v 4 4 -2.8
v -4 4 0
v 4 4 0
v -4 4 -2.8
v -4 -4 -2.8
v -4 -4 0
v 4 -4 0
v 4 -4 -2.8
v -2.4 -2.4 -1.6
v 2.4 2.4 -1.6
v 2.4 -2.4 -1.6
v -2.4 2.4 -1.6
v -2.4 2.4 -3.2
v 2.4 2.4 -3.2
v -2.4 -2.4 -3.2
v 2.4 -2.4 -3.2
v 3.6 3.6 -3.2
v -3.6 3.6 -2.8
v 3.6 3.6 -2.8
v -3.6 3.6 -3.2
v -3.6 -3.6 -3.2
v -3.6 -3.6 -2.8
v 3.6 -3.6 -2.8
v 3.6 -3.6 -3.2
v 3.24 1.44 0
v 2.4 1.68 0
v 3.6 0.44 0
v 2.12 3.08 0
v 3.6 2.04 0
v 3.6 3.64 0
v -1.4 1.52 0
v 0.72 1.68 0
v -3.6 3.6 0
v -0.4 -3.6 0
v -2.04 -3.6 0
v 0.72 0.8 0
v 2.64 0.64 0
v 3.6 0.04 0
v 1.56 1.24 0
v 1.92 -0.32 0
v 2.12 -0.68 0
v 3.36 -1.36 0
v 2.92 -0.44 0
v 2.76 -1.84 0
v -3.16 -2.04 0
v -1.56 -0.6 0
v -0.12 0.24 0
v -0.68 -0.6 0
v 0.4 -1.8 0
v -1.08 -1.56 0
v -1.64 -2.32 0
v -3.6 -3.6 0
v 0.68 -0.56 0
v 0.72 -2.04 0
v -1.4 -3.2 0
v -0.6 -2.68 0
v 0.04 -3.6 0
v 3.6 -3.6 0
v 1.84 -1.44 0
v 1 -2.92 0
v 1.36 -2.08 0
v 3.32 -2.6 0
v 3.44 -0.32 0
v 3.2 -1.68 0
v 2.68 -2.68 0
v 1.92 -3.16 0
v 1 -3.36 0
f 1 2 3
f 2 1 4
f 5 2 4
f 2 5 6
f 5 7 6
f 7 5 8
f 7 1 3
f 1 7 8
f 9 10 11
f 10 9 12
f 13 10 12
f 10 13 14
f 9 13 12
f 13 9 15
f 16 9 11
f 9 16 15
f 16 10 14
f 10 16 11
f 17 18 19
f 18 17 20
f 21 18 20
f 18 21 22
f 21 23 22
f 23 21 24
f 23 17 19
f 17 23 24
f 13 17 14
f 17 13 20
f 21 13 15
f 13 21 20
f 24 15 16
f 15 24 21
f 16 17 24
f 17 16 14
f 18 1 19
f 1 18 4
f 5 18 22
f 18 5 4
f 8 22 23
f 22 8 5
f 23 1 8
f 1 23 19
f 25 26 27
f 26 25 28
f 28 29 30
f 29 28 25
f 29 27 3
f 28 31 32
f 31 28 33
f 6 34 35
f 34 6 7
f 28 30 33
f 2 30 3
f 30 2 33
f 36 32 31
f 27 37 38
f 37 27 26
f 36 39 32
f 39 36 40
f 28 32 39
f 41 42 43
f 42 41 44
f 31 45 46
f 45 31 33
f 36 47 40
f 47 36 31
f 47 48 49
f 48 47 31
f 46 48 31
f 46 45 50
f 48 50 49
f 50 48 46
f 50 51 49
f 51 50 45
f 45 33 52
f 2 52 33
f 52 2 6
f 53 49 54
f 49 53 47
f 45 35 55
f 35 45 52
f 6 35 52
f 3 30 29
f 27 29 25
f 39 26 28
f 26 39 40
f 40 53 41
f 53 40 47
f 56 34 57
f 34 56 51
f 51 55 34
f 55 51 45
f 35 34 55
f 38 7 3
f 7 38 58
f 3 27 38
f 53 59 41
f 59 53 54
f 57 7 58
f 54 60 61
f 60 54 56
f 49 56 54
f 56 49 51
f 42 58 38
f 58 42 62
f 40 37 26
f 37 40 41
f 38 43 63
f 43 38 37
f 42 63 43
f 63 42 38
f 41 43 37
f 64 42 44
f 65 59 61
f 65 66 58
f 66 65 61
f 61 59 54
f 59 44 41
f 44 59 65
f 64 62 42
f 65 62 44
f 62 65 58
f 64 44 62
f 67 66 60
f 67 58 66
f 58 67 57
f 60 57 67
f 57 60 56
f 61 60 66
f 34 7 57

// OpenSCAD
// file: ../p/box5.scad
use <../lib.scad>
function ldraw_lib__box5() = [
// 0 Box with 5 Faces and All Edges
// 0 Name: box5.dat
// 0 Author: James Jessiman
// 0 !LDRAW_ORG Primitive UPDATE 2012-01
// 0 !LICENSE Licensed under CC BY 4.0 : see CAreadme.txt
// 
// 0 BFC CERTIFY CCW
  [0,"BFC","CERTIFY"],
  [0,"BFC","CCW"],
// 
// 0 !HISTORY 2002-04-03 [sbliss] Modified for BFC compliance
// 0 !HISTORY 2002-04-25 [PTadmin] Official Update 2002-02
// 0 !HISTORY 2007-06-24 [PTadmin] Header formatted for Contributor Agreement
// 0 !HISTORY 2008-07-01 [PTadmin] Official Update 2008-01
// 0 !HISTORY 2012-02-16 [Philo] Changed to CCW
// 0 !HISTORY 2012-03-30 [PTadmin] Official Update 2012-01
// 
// 
// 2 24 1 1 1 -1 1 1
  [2,24,1,1,1,-1,1,1],
// 2 24 -1 1 1 -1 1 -1
  [2,24,-1,1,1,-1,1,-1],
// 2 24 -1 1 -1 1 1 -1
  [2,24,-1,1,-1,1,1,-1],
// 2 24 1 1 -1 1 1 1
  [2,24,1,1,-1,1,1,1],
// 2 24 1 0 1 -1 0 1
  [2,24,1,0,1,-1,0,1],
// 2 24 -1 0 1 -1 0 -1
  [2,24,-1,0,1,-1,0,-1],
// 2 24 -1 0 -1 1 0 -1
  [2,24,-1,0,-1,1,0,-1],
// 2 24 1 0 -1 1 0 1
  [2,24,1,0,-1,1,0,1],
// 2 24 1 0 1 1 1 1
  [2,24,1,0,1,1,1,1],
// 2 24 -1 0 1 -1 1 1
  [2,24,-1,0,1,-1,1,1],
// 2 24 1 0 -1 1 1 -1
  [2,24,1,0,-1,1,1,-1],
// 2 24 -1 0 -1 -1 1 -1
  [2,24,-1,0,-1,-1,1,-1],
// 4 16 -1 1 1 1 1 1 1 1 -1 -1 1 -1
  [4,16,-1,1,1,1,1,1,1,1,-1,-1,1,-1],
// 4 16 -1 1 1 -1 0 1 1 0 1 1 1 1
  [4,16,-1,1,1,-1,0,1,1,0,1,1,1,1],
// 4 16 -1 1 -1 -1 0 -1 -1 0 1 -1 1 1
  [4,16,-1,1,-1,-1,0,-1,-1,0,1,-1,1,1],
// 4 16 1 1 -1 1 0 -1 -1 0 -1 -1 1 -1
  [4,16,1,1,-1,1,0,-1,-1,0,-1,-1,1,-1],
// 4 16 1 1 1 1 0 1 1 0 -1 1 1 -1
  [4,16,1,1,1,1,0,1,1,0,-1,1,1,-1],
];
module ldraw_lib__box5(step=0, col=false, unit=2/5, alt=false, line=0.2, solid=!$preview)
    makepoly(ldraw_lib__box5(), step=step, col=col, unit=unit, alt=alt, line=line, solid=solid);
ldraw_lib__box5(line=0.2);
// file: ../p/box4.scad
use <../lib.scad>
function ldraw_lib__box4() = [
// 0 Box with 4 Faces (2 Parallel Pairs) and All Edges
// 0 Name: box4.dat
// 0 Author: James Jessiman
// 0 !LDRAW_ORG Primitive UPDATE 2012-01
// 0 !LICENSE Licensed under CC BY 4.0 : see CAreadme.txt
// 
// 0 BFC CERTIFY CCW
  [0,"BFC","CERTIFY"],
  [0,"BFC","CCW"],
// 
// 0 !HISTORY 2002-04-03 [sbliss] Modified for BFC compliance
// 0 !HISTORY 2002-04-25 [PTadmin] Official Update 2002-02
// 0 !HISTORY 2007-06-24 [PTadmin] Header formatted for Contributor Agreement
// 0 !HISTORY 2008-07-01 [PTadmin] Official Update 2008-01
// 0 !HISTORY 2012-02-16 [Philo] Changed to CCW
// 0 !HISTORY 2012-03-30 [PTadmin] Official Update 2012-01
// 
// 
// 2 24 1 1 1 -1 1 1
  [2,24,1,1,1,-1,1,1],
// 2 24 -1 1 1 -1 1 -1
  [2,24,-1,1,1,-1,1,-1],
// 2 24 -1 1 -1 1 1 -1
  [2,24,-1,1,-1,1,1,-1],
// 2 24 1 1 -1 1 1 1
  [2,24,1,1,-1,1,1,1],
// 2 24 1 0 1 -1 0 1
  [2,24,1,0,1,-1,0,1],
// 2 24 -1 0 1 -1 0 -1
  [2,24,-1,0,1,-1,0,-1],
// 2 24 -1 0 -1 1 0 -1
  [2,24,-1,0,-1,1,0,-1],
// 2 24 1 0 -1 1 0 1
  [2,24,1,0,-1,1,0,1],
// 2 24 1 0 1 1 1 1
  [2,24,1,0,1,1,1,1],
// 2 24 -1 0 1 -1 1 1
  [2,24,-1,0,1,-1,1,1],
// 2 24 1 0 -1 1 1 -1
  [2,24,1,0,-1,1,1,-1],
// 2 24 -1 0 -1 -1 1 -1
  [2,24,-1,0,-1,-1,1,-1],
// 4 16 -1 1 1 -1 0 1 1 0 1 1 1 1
  [4,16,-1,1,1,-1,0,1,1,0,1,1,1,1],
// 4 16 -1 1 -1 -1 0 -1 -1 0 1 -1 1 1
  [4,16,-1,1,-1,-1,0,-1,-1,0,1,-1,1,1],
// 4 16 1 1 -1 1 0 -1 -1 0 -1 -1 1 -1
  [4,16,1,1,-1,1,0,-1,-1,0,-1,-1,1,-1],
// 4 16 1 1 1 1 0 1 1 0 -1 1 1 -1
  [4,16,1,1,1,1,0,1,1,0,-1,1,1,-1],
];
module ldraw_lib__box4(step=0, col=false, unit=2/5, alt=false, line=0.2, solid=!$preview)
    makepoly(ldraw_lib__box4(), step=step, col=col, unit=unit, alt=alt, line=line, solid=solid);
ldraw_lib__box4(line=0.2);
// file: s/3070bs01.scad
use <../../lib.scad>
use <../../p/box4.scad>
use <../../p/box5.scad>
function ldraw_lib__s__3070bs01() = [
// 0 ~Tile  1 x  1 with Groove without Top Face
// 0 Name: s\3070bs01.dat
// 0 Author: Chris Dee [cwdee]
// 0 !LDRAW_ORG Subpart UPDATE 2009-02
// 0 !LICENSE Licensed under CC BY 4.0 : see CAreadme.txt
// 
// 0 BFC CERTIFY CCW
  [0,"BFC","CERTIFY"],
  [0,"BFC","CCW"],
// 
// 0 !HISTORY 2009-09-03 [PTadmin] Official Update 2009-02
// 
// 
// 1 16 0 0 0 10 0 0 0 7 0 0 0 10 box4.dat
  [1,16,0,0,0,10,0,0,0,7,0,0,0,10, ldraw_lib__box4()],
// 0 BFC INVERTNEXT
  [0,"BFC","INVERTNEXT"],
// 1 16 0 8 0 6 0 0 0 -4 0 0 0 6 box5.dat
  [1,16,0,8,0,6,0,0,0,-4,0,0,0,6, ldraw_lib__box5()],
// 1 16 0 7 0 9 0 0 0 1 0 0 0 9 box4.dat
  [1,16,0,7,0,9,0,0,0,1,0,0,0,9, ldraw_lib__box4()],
// 
// 4 16 9 8 9 6 8 6 -6 8 6 -9 8 9
  [4,16,9,8,9,6,8,6,-6,8,6,-9,8,9],
// 4 16 -9 8 9 -6 8 6 -6 8 -6 -9 8 -9
  [4,16,-9,8,9,-6,8,6,-6,8,-6,-9,8,-9],
// 4 16 -9 8 -9 -6 8 -6 6 8 -6 9 8 -9
  [4,16,-9,8,-9,-6,8,-6,6,8,-6,9,8,-9],
// 4 16 9 8 -9 6 8 -6 6 8 6 9 8 9
  [4,16,9,8,-9,6,8,-6,6,8,6,9,8,9],
// 
// 4 16 10 7 10 9 7 9 -9 7 9 -10 7 10
  [4,16,10,7,10,9,7,9,-9,7,9,-10,7,10],
// 4 16 -10 7 10 -9 7 9 -9 7 -9 -10 7 -10
  [4,16,-10,7,10,-9,7,9,-9,7,-9,-10,7,-10],
// 4 16 -10 7 -10 -9 7 -9 9 7 -9 10 7 -10
  [4,16,-10,7,-10,-9,7,-9,9,7,-9,10,7,-10],
// 4 16 10 7 -10 9 7 -9 9 7 9 10 7 10
  [4,16,10,7,-10,9,7,-9,9,7,9,10,7,10],
// 0
];
module ldraw_lib__s__3070bs01(step=0, col=false, unit=2/5, alt=false, line=0.2, solid=!$preview)
    makepoly(ldraw_lib__s__3070bs01(), step=step, col=col, unit=unit, alt=alt, line=line, solid=solid);
ldraw_lib__s__3070bs01(line=0.2);
// main file
use <../lib.scad>
use <s/3070bs01.scad>
function ldraw_lib__3070bp0z() = [
// 0 Tile  1 x  1 with Color Explosion on Blue Background Pattern
// 0 Name: 3070bp0z.dat
// 0 Author: Philippe Hurbain [Philo]
// 0 !LDRAW_ORG Part UPDATE 2026-08
// 0 !LICENSE Licensed under CC BY 4.0 : see CAreadme.txt
// 
// 0 BFC CERTIFY CCW
  [0,"BFC","CERTIFY"],
  [0,"BFC","CCW"],
// 
// 0 !CATEGORY Tile
// 0 !KEYWORDS BrickLink 3070pb158, Brickowl 488937, Dots, Rebrickable 3070bpr0022
// 0 !KEYWORDS Set 41916
// 
// 0 !HISTORY 2020-12-29 [PTadmin] Official Update 2020-03
// 0 !HISTORY 2026-08-25 [MagFors] Update description
// 0 !HISTORY 2026-08-31 [OrionP] Official Update 2026-08
// 
// 1 16 0 0 0 1 0 0 0 1 0 0 0 1 s\3070bs01.dat
  [1,16,0,0,0,1,0,0,0,1,0,0,0,1, ldraw_lib__s__3070bs01()],
// 4 29 6 0 4.2 9 0 1.1 8.1 0 3.6 5.3 0 7.7
  [4,29,6,0,4.2,9,0,1.1,8.1,0,3.6,5.3,0,7.7],
// 4 1 5.3 0 7.7 8.1 0 3.6 9 0 5.1 9 0 9.1
  [4,1,5.3,0,7.7,8.1,0,3.6,9,0,5.1,9,0,9.1],
// 3 16 9 0 5.1 9 0 1.1 10 0 10
  [3,16,9,0,5.1,9,0,1.1,10,0,10],
// 4 1 -3.5 0 3.8 1.8 0 4.2 5.3 0 7.7 -9 0 9
  [4,1,-3.5,0,3.8,1.8,0,4.2,5.3,0,7.7,-9,0,9],
// 4 16 -1 0 -9 -5.1 0 -9 -10 0 -10 10 0 -10
  [4,16,-1,0,-9,-5.1,0,-9,-10,0,-10,10,0,-10],
// 3 1 5.3 0 7.7 9 0 9.1 -9 0 9
  [3,1,5.3,0,7.7,9,0,9.1,-9,0,9],
// 4 16 -9 0 9 9 0 9.1 10 0 10 -10 0 10
  [4,16,-9,0,9,9,0,9.1,10,0,10,-10,0,10],
// 3 1 1.8 0 2 1.8 0 4.2 -3.5 0 3.8
  [3,1,1.8,0,2,1.8,0,4.2,-3.5,0,3.8],
// 4 16 6.6 0 1.6 9 0 0.1 9 0 1.1 6 0 4.2
  [4,16,6.6,0,1.6,9,0,0.1,9,0,1.1,6,0,4.2],
// 4 29 3.9 0 3.1 1.8 0 4.2 1.8 0 2 4.8 0 -0.8
  [4,29,3.9,0,3.1,1.8,0,4.2,1.8,0,2,4.8,0,-0.8],
// 3 1 5.3 0 7.7 1.8 0 4.2 3.9 0 3.1
  [3,1,5.3,0,7.7,1.8,0,4.2,3.9,0,3.1],
// 4 14 5.3 0 -1.7 6.9 0 -4.6 8.4 0 -3.4 7.3 0 -1.1
  [4,14,5.3,0,-1.7,6.9,0,-4.6,8.4,0,-3.4,7.3,0,-1.1],
// 4 1 -7.9 0 -5.1 -3.9 0 -1.5 -3.5 0 3.8 -9 0 9
  [4,1,-7.9,0,-5.1,-3.9,0,-1.5,-3.5,0,3.8,-9,0,9],
// 4 29 -0.3 0 0.6 4.8 0 -0.8 1.8 0 2 -3.5 0 3.8
  [4,29,-0.3,0,0.6,4.8,0,-0.8,1.8,0,2,-3.5,0,3.8],
// 4 29 -1.7 0 -1.5 1 0 -4.5 -0.3 0 0.6 -3.5 0 3.8
  [4,29,-1.7,0,-1.5,1,0,-4.5,-0.3,0,0.6,-3.5,0,3.8],
// 3 1 -3.9 0 -1.5 -1.7 0 -1.5 -3.5 0 3.8
  [3,1,-3.9,0,-1.5,-1.7,0,-1.5,-3.5,0,3.8],
// 3 1 -3.9 0 -1.5 -7.9 0 -5.1 -2.7 0 -3.9
  [3,1,-3.9,0,-1.5,-7.9,0,-5.1,-2.7,0,-3.9],
// 4 29 -1.7 0 -1.5 -3.9 0 -1.5 -2.7 0 -3.9 1 0 -4.5
  [4,29,-1.7,0,-1.5,-3.9,0,-1.5,-2.7,0,-3.9,1,0,-4.5],
// 4 29 -4.1 0 -5.8 1 0 -4.5 -2.7 0 -3.9 -7.9 0 -5.1
  [4,29,-4.1,0,-5.8,1,0,-4.5,-2.7,0,-3.9,-7.9,0,-5.1],
// 3 1 -7.9 0 -5.1 -9 0 9 -9 0 -9
  [3,1,-7.9,0,-5.1,-9,0,9,-9,0,-9],
// 4 16 -9 0 -9 -9 0 9 -10 0 10 -10 0 -10
  [4,16,-9,0,-9,-9,0,9,-10,0,10,-10,0,-10],
// 4 16 1.7 0 -1.4 -0.3 0 0.6 1 0 -4.5 1.8 0 -5.1
  [4,16,1.7,0,-1.4,-0.3,0,0.6,1,0,-4.5,1.8,0,-5.1],
// 4 1 -5.1 0 -9 -3.5 0 -8 -7.9 0 -5.1 -9 0 -9
  [4,1,-5.1,0,-9,-3.5,0,-8,-7.9,0,-5.1,-9,0,-9],
// 3 16 -10 0 -10 -5.1 0 -9 -9 0 -9
  [3,16,-10,0,-10,-5.1,0,-9,-9,0,-9],
// 3 16 10 0 10 9 0 9.1 9 0 5.1
  [3,16,10,0,10,9,0,9.1,9,0,5.1],
// 3 29 9 0 1.1 9 0 5.1 8.1 0 3.6
  [3,29,9,0,1.1,9,0,5.1,8.1,0,3.6],
// 4 29 6 0 4.2 5.3 0 7.7 3.9 0 3.1 4.8 0 -0.8
  [4,29,6,0,4.2,5.3,0,7.7,3.9,0,3.1,4.8,0,-0.8],
// 4 16 4.8 0 -0.8 -0.3 0 0.6 1.7 0 -1.4 5.3 0 -1.7
  [4,16,4.8,0,-0.8,-0.3,0,0.6,1.7,0,-1.4,5.3,0,-1.7],
// 4 16 -1.5 0 -6.7 -4.1 0 -5.8 -1 0 -9 0.1 0 -9
  [4,16,-1.5,0,-6.7,-4.1,0,-5.8,-1,0,-9,0.1,0,-9],
// 4 29 -4.1 0 -5.8 -7.9 0 -5.1 -3.5 0 -8 -1 0 -9
  [4,29,-4.1,0,-5.8,-7.9,0,-5.1,-3.5,0,-8,-1,0,-9],
// 3 29 -5.1 0 -9 -1 0 -9 -3.5 0 -8
  [3,29,-5.1,0,-9,-1,0,-9,-3.5,0,-8],
// 4 16 10 0 -10 10 0 10 9 0 0.1 9 0 -9
  [4,16,10,0,-10,10,0,10,9,0,0.1,9,0,-9],
// 3 16 10 0 10 9 0 1.1 9 0 0.1
  [3,16,10,0,10,9,0,1.1,9,0,0.1],
// 4 14 1.7 0 -1.4 1.8 0 -5.1 4.6 0 -3.6 5.3 0 -1.7
  [4,14,1.7,0,-1.4,1.8,0,-5.1,4.6,0,-3.6,5.3,0,-1.7],
// 3 16 0.1 0 -9 10 0 -10 9 0 -9
  [3,16,0.1,0,-9,10,0,-10,9,0,-9],
// 4 14 1.8 0 -5.1 -1.5 0 -6.7 2.5 0 -7.3 3.4 0 -5.2
  [4,14,1.8,0,-5.1,-1.5,0,-6.7,2.5,0,-7.3,3.4,0,-5.2],
// 4 16 1 0 -4.5 -4.1 0 -5.8 -1.5 0 -6.7 1.8 0 -5.1
  [4,16,1,0,-4.5,-4.1,0,-5.8,-1.5,0,-6.7,1.8,0,-5.1],
// 4 14 8.4 0 -3.4 8.3 0 -6.5 9 0 -9 9 0 0.1
  [4,14,8.4,0,-3.4,8.3,0,-6.5,9,0,-9,9,0,0.1],
// 4 16 6.6 0 1.6 6 0 4.2 4.8 0 -0.8 5.3 0 -1.7
  [4,16,6.6,0,1.6,6,0,4.2,4.8,0,-0.8,5.3,0,-1.7],
// 4 14 8.6 0 -0.8 9 0 0.1 6.6 0 1.6 7.3 0 -1.1
  [4,14,8.6,0,-0.8,9,0,0.1,6.6,0,1.6,7.3,0,-1.1],
// 3 1 8.4 0 -3.4 8.6 0 -0.8 7.3 0 -1.1
  [3,1,8.4,0,-3.4,8.6,0,-0.8,7.3,0,-1.1],
// 3 14 8.6 0 -0.8 8.4 0 -3.4 9 0 0.1
  [3,14,8.6,0,-0.8,8.4,0,-3.4,9,0,0.1],
// 3 14 5.3 0 -1.7 7.3 0 -1.1 6.6 0 1.6
  [3,14,5.3,0,-1.7,7.3,0,-1.1,6.6,0,1.6],
// 3 14 8 0 -4.2 8.4 0 -3.4 6.9 0 -4.6
  [3,14,8,0,-4.2,8.4,0,-3.4,6.9,0,-4.6],
// 3 1 6.7 0 -6.7 4.6 0 -3.6 3.4 0 -5.2
  [3,1,6.7,0,-6.7,4.6,0,-3.6,3.4,0,-5.2],
// 4 14 4.8 0 -7.9 9 0 -9 6.7 0 -6.7 3.4 0 -5.2
  [4,14,4.8,0,-7.9,9,0,-9,6.7,0,-6.7,3.4,0,-5.2],
// 3 14 3.4 0 -5.2 4.6 0 -3.6 1.8 0 -5.1
  [3,14,3.4,0,-5.2,4.6,0,-3.6,1.8,0,-5.1],
// 4 14 6.9 0 -4.6 5.3 0 -1.7 4.6 0 -3.6 6.7 0 -6.7
  [4,14,6.9,0,-4.6,5.3,0,-1.7,4.6,0,-3.6,6.7,0,-6.7],
// 3 14 8 0 -4.2 8.3 0 -6.5 8.4 0 -3.4
  [3,14,8,0,-4.2,8.3,0,-6.5,8.4,0,-3.4],
// 4 14 6.7 0 -6.7 9 0 -9 8.3 0 -6.5 6.9 0 -4.6
  [4,14,6.7,0,-6.7,9,0,-9,8.3,0,-6.5,6.9,0,-4.6],
// 3 16 8 0 -4.2 6.9 0 -4.6 8.3 0 -6.5
  [3,16,8,0,-4.2,6.9,0,-4.6,8.3,0,-6.5],
// 3 16 2.5 0 -8.4 4.8 0 -7.9 2.5 0 -7.3
  [3,16,2.5,0,-8.4,4.8,0,-7.9,2.5,0,-7.3],
// 4 14 9 0 -9 4.8 0 -7.9 2.5 0 -8.4 0.1 0 -9
  [4,14,9,0,-9,4.8,0,-7.9,2.5,0,-8.4,0.1,0,-9],
// 4 14 0.1 0 -9 2.5 0 -8.4 2.5 0 -7.3 -1.5 0 -6.7
  [4,14,0.1,0,-9,2.5,0,-8.4,2.5,0,-7.3,-1.5,0,-6.7],
// 3 14 3.4 0 -5.2 2.5 0 -7.3 4.8 0 -7.9
  [3,14,3.4,0,-5.2,2.5,0,-7.3,4.8,0,-7.9],
// 3 16 -1 0 -9 10 0 -10 0.1 0 -9
  [3,16,-1,0,-9,10,0,-10,0.1,0,-9],
];
module ldraw_lib__3070bp0z(step=0, col=false, unit=2/5, alt=false, line=0.2, solid=!$preview)
    makepoly(ldraw_lib__3070bp0z(), step=step, col=col, unit=unit, alt=alt, line=line, solid=solid);
ldraw_lib__3070bp0z(line=0.2);
